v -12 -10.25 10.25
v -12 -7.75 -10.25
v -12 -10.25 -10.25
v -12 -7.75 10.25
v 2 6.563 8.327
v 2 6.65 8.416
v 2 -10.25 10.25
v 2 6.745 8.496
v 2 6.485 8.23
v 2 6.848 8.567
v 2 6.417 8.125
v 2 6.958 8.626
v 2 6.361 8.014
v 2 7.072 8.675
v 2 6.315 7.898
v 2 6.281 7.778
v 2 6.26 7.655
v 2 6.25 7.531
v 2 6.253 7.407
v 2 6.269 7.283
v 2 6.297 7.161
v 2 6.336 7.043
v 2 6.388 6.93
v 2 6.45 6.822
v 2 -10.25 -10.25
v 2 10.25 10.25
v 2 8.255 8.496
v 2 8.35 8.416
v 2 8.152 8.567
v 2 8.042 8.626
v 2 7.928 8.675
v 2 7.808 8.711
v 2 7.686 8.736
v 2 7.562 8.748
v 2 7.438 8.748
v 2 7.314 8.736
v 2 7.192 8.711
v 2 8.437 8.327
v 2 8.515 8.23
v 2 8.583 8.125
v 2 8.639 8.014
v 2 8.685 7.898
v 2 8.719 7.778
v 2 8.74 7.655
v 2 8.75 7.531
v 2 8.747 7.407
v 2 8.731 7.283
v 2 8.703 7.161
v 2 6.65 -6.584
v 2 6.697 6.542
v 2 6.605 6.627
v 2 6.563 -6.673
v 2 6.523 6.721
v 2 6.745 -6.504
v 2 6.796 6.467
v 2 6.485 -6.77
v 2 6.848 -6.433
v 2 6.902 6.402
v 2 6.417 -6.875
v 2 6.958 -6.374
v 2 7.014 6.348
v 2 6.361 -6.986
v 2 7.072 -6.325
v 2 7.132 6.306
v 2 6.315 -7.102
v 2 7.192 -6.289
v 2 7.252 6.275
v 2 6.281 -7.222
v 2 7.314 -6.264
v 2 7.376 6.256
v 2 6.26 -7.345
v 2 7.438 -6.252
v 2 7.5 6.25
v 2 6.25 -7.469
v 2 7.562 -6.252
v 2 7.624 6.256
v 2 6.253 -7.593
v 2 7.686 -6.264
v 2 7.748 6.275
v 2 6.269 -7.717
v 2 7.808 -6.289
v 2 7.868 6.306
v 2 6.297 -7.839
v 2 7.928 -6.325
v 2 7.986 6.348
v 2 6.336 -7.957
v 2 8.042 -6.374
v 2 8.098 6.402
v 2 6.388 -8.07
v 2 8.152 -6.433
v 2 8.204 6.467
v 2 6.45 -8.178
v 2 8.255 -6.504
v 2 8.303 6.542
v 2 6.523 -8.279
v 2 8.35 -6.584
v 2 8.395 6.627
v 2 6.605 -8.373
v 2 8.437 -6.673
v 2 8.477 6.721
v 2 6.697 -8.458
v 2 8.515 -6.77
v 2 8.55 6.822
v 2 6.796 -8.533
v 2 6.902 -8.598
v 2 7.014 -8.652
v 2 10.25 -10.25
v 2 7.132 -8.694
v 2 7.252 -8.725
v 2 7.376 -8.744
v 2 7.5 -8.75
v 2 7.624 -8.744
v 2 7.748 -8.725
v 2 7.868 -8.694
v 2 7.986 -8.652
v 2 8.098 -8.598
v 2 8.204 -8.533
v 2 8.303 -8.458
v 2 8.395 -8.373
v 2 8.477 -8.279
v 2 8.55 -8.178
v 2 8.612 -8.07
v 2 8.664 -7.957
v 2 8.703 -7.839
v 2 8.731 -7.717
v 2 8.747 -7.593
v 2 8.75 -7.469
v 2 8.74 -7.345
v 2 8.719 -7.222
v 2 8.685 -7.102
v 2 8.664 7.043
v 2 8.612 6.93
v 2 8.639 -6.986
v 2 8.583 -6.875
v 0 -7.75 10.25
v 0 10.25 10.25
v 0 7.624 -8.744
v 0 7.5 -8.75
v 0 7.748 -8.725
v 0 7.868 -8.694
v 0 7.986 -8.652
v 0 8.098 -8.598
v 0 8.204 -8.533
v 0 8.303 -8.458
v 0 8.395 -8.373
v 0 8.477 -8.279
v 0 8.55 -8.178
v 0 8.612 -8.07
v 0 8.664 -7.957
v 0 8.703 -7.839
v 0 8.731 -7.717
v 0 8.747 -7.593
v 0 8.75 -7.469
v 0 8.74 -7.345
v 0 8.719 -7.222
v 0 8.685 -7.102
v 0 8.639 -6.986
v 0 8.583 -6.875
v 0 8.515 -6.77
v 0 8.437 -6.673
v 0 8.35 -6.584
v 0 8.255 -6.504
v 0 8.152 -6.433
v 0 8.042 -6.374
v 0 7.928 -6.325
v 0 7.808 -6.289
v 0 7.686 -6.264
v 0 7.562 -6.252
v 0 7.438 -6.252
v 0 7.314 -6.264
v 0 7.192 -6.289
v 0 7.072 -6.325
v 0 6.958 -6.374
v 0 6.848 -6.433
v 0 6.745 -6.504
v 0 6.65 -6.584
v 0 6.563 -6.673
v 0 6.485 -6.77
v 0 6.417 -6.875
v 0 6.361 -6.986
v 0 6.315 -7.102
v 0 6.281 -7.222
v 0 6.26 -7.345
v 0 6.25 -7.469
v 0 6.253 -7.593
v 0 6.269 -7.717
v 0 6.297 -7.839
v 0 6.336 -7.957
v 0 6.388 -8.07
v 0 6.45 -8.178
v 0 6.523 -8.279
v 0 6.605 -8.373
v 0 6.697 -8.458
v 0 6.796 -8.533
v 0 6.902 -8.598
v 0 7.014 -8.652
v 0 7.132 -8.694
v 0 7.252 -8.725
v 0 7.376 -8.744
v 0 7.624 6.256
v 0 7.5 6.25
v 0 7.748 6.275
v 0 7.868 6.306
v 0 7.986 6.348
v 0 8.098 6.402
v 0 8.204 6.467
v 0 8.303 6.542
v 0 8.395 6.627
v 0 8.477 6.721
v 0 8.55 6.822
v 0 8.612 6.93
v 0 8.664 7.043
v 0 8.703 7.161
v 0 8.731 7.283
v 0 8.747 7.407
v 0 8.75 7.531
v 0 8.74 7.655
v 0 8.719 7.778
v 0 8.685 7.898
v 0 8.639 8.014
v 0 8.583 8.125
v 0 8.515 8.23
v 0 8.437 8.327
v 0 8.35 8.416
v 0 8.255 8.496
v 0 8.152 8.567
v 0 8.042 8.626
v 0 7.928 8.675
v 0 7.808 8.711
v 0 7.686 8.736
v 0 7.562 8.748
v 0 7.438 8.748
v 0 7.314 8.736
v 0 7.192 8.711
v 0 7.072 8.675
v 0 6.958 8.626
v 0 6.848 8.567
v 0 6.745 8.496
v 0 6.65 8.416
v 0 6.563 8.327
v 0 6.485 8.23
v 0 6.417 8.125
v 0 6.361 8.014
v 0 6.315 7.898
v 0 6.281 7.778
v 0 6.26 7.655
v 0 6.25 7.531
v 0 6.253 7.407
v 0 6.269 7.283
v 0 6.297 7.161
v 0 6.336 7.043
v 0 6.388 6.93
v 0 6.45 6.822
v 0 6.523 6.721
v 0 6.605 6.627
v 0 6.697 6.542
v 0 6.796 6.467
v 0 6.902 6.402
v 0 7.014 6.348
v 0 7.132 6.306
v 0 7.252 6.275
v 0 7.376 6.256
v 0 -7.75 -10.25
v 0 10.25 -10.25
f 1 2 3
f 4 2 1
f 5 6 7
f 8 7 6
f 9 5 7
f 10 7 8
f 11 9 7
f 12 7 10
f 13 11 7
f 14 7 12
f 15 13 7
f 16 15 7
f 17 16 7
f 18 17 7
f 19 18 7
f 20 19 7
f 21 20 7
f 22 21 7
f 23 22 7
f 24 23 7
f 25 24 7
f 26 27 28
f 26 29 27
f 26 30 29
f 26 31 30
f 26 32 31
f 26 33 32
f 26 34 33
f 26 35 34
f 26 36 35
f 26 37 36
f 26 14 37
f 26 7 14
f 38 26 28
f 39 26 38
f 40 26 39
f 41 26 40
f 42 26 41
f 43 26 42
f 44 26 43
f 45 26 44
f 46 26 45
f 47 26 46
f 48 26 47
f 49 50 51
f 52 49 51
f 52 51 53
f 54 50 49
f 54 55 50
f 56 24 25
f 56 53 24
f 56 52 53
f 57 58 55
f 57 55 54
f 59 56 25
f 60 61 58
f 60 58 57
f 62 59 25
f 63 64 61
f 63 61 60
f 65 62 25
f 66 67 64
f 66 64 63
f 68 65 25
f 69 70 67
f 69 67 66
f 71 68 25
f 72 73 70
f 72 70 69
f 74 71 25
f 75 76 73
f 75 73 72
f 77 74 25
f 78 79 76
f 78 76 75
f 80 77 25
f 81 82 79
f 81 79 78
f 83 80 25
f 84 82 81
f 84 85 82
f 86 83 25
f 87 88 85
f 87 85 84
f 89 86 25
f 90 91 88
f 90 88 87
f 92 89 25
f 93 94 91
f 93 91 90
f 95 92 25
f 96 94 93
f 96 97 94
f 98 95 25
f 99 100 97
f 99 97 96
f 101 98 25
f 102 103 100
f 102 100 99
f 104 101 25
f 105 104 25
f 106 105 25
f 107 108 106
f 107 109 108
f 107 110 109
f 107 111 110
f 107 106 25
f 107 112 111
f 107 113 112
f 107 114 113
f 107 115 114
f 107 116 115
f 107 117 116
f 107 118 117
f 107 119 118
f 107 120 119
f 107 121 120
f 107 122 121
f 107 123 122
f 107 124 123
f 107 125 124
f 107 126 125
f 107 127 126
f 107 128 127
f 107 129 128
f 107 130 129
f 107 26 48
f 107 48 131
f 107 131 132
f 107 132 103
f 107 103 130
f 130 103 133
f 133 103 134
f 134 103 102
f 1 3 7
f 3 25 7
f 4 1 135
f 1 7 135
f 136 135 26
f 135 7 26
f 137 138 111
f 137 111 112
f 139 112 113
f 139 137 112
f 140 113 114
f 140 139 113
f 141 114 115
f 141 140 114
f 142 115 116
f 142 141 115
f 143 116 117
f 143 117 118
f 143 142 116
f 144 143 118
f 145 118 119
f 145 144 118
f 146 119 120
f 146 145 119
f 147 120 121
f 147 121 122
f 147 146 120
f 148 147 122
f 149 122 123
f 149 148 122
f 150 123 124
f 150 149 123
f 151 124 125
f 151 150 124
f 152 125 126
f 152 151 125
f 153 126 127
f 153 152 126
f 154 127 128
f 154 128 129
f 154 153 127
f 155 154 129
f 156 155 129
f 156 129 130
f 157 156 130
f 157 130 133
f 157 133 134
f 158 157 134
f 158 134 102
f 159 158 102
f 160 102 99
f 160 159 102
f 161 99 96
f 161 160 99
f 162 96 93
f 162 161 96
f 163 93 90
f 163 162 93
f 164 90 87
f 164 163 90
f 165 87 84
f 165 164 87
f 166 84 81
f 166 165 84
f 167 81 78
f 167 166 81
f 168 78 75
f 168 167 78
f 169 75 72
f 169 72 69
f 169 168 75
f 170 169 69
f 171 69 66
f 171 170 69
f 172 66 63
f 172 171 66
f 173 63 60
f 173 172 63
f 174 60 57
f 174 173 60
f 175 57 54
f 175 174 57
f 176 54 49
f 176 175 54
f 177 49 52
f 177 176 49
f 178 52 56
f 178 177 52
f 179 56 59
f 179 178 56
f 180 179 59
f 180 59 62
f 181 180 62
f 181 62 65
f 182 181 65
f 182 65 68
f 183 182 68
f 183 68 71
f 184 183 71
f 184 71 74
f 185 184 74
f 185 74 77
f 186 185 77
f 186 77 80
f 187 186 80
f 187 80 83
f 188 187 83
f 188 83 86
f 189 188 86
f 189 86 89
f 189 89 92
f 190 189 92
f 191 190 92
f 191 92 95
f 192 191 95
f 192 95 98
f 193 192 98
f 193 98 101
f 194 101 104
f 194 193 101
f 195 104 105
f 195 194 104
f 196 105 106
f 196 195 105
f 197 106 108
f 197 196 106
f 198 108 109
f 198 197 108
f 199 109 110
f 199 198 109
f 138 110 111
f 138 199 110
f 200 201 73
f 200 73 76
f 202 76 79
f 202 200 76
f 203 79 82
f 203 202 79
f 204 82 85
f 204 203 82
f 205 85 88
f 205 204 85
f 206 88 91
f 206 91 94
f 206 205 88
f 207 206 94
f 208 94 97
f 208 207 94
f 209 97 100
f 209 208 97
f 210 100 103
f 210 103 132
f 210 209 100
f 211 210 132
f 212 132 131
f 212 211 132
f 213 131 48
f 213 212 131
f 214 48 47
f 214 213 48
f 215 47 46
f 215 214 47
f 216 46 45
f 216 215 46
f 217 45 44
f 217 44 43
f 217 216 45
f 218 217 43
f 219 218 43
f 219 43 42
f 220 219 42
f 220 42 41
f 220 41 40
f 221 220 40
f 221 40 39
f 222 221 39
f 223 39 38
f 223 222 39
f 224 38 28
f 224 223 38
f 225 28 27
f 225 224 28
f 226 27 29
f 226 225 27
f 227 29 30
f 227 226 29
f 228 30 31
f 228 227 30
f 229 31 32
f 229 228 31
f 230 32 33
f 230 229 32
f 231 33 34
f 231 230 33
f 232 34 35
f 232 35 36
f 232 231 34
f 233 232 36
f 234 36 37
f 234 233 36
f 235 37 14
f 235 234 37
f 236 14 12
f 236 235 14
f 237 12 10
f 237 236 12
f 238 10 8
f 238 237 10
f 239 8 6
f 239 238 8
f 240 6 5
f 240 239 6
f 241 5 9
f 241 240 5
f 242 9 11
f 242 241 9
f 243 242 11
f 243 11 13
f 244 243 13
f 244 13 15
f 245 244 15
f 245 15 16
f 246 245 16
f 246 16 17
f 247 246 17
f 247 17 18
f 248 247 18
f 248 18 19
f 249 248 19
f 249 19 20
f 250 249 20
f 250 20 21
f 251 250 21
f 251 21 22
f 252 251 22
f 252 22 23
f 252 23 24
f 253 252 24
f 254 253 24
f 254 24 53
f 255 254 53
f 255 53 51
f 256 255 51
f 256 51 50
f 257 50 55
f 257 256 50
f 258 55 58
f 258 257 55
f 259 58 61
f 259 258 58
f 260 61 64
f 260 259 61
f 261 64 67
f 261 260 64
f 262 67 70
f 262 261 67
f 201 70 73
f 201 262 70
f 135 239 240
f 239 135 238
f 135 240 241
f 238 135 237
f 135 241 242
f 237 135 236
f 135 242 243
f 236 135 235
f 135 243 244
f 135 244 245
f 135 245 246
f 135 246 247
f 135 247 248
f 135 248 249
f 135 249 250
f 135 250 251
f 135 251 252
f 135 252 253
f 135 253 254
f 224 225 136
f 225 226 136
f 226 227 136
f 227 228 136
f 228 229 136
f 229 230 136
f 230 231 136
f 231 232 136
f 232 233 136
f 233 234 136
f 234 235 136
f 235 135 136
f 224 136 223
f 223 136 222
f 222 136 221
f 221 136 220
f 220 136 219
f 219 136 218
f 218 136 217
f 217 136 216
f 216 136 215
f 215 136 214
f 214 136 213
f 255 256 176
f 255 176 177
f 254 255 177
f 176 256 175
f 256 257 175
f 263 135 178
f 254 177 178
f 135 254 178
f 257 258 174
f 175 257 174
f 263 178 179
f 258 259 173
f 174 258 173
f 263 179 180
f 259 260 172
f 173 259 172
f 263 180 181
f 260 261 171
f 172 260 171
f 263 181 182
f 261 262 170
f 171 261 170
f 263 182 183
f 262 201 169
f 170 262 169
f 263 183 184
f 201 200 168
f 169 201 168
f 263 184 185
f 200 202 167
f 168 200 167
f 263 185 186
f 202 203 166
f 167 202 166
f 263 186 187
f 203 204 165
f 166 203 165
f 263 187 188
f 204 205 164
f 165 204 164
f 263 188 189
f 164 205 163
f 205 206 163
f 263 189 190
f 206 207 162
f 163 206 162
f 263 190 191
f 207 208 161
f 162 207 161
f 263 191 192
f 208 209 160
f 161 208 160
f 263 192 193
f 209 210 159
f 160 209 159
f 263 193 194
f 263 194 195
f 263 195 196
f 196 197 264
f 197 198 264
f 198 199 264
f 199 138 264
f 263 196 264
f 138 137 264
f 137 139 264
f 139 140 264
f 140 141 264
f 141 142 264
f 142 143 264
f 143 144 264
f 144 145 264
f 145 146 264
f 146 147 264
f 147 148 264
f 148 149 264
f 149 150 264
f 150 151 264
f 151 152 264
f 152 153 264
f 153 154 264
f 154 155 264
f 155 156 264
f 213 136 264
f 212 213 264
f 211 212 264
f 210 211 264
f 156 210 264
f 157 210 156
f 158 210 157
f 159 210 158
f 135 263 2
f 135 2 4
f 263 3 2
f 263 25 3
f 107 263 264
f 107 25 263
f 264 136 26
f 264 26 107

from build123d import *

# Parameters (mm, degrees)
SKETCH1_W           = 20.5
SKETCH1_H           = 20.5
SKETCH1_R           = 1.25
BOSS_EXTRUDE1_DEPTH = 2
SKETCH2_W           = 20.5
SKETCH2_H           = 2.5
BOSS_EXTRUDE2_DEPTH = 12


with BuildPart() as part:
    # Sketch1 → Boss-Extrude1 (new body)
    with BuildSketch(Plane(origin=(0, 0, 0), x_dir=(0, 0, -1), z_dir=(1, 0, 0))):
        Rectangle(SKETCH1_W, SKETCH1_H)
        with Locations((-7.5, 7.5)):
            Circle(SKETCH1_R, mode=Mode.SUBTRACT)
        with Locations((7.5, 7.5)):
            Circle(SKETCH1_R, mode=Mode.SUBTRACT)
    extrude(amount=BOSS_EXTRUDE1_DEPTH)

    # Sketch2 → Boss-Extrude2 (add)
    with BuildSketch(Plane.ZY):
        with Locations((0, -9)):
            Rectangle(SKETCH2_W, SKETCH2_H)
    extrude(amount=BOSS_EXTRUDE2_DEPTH)


solid = part.part
